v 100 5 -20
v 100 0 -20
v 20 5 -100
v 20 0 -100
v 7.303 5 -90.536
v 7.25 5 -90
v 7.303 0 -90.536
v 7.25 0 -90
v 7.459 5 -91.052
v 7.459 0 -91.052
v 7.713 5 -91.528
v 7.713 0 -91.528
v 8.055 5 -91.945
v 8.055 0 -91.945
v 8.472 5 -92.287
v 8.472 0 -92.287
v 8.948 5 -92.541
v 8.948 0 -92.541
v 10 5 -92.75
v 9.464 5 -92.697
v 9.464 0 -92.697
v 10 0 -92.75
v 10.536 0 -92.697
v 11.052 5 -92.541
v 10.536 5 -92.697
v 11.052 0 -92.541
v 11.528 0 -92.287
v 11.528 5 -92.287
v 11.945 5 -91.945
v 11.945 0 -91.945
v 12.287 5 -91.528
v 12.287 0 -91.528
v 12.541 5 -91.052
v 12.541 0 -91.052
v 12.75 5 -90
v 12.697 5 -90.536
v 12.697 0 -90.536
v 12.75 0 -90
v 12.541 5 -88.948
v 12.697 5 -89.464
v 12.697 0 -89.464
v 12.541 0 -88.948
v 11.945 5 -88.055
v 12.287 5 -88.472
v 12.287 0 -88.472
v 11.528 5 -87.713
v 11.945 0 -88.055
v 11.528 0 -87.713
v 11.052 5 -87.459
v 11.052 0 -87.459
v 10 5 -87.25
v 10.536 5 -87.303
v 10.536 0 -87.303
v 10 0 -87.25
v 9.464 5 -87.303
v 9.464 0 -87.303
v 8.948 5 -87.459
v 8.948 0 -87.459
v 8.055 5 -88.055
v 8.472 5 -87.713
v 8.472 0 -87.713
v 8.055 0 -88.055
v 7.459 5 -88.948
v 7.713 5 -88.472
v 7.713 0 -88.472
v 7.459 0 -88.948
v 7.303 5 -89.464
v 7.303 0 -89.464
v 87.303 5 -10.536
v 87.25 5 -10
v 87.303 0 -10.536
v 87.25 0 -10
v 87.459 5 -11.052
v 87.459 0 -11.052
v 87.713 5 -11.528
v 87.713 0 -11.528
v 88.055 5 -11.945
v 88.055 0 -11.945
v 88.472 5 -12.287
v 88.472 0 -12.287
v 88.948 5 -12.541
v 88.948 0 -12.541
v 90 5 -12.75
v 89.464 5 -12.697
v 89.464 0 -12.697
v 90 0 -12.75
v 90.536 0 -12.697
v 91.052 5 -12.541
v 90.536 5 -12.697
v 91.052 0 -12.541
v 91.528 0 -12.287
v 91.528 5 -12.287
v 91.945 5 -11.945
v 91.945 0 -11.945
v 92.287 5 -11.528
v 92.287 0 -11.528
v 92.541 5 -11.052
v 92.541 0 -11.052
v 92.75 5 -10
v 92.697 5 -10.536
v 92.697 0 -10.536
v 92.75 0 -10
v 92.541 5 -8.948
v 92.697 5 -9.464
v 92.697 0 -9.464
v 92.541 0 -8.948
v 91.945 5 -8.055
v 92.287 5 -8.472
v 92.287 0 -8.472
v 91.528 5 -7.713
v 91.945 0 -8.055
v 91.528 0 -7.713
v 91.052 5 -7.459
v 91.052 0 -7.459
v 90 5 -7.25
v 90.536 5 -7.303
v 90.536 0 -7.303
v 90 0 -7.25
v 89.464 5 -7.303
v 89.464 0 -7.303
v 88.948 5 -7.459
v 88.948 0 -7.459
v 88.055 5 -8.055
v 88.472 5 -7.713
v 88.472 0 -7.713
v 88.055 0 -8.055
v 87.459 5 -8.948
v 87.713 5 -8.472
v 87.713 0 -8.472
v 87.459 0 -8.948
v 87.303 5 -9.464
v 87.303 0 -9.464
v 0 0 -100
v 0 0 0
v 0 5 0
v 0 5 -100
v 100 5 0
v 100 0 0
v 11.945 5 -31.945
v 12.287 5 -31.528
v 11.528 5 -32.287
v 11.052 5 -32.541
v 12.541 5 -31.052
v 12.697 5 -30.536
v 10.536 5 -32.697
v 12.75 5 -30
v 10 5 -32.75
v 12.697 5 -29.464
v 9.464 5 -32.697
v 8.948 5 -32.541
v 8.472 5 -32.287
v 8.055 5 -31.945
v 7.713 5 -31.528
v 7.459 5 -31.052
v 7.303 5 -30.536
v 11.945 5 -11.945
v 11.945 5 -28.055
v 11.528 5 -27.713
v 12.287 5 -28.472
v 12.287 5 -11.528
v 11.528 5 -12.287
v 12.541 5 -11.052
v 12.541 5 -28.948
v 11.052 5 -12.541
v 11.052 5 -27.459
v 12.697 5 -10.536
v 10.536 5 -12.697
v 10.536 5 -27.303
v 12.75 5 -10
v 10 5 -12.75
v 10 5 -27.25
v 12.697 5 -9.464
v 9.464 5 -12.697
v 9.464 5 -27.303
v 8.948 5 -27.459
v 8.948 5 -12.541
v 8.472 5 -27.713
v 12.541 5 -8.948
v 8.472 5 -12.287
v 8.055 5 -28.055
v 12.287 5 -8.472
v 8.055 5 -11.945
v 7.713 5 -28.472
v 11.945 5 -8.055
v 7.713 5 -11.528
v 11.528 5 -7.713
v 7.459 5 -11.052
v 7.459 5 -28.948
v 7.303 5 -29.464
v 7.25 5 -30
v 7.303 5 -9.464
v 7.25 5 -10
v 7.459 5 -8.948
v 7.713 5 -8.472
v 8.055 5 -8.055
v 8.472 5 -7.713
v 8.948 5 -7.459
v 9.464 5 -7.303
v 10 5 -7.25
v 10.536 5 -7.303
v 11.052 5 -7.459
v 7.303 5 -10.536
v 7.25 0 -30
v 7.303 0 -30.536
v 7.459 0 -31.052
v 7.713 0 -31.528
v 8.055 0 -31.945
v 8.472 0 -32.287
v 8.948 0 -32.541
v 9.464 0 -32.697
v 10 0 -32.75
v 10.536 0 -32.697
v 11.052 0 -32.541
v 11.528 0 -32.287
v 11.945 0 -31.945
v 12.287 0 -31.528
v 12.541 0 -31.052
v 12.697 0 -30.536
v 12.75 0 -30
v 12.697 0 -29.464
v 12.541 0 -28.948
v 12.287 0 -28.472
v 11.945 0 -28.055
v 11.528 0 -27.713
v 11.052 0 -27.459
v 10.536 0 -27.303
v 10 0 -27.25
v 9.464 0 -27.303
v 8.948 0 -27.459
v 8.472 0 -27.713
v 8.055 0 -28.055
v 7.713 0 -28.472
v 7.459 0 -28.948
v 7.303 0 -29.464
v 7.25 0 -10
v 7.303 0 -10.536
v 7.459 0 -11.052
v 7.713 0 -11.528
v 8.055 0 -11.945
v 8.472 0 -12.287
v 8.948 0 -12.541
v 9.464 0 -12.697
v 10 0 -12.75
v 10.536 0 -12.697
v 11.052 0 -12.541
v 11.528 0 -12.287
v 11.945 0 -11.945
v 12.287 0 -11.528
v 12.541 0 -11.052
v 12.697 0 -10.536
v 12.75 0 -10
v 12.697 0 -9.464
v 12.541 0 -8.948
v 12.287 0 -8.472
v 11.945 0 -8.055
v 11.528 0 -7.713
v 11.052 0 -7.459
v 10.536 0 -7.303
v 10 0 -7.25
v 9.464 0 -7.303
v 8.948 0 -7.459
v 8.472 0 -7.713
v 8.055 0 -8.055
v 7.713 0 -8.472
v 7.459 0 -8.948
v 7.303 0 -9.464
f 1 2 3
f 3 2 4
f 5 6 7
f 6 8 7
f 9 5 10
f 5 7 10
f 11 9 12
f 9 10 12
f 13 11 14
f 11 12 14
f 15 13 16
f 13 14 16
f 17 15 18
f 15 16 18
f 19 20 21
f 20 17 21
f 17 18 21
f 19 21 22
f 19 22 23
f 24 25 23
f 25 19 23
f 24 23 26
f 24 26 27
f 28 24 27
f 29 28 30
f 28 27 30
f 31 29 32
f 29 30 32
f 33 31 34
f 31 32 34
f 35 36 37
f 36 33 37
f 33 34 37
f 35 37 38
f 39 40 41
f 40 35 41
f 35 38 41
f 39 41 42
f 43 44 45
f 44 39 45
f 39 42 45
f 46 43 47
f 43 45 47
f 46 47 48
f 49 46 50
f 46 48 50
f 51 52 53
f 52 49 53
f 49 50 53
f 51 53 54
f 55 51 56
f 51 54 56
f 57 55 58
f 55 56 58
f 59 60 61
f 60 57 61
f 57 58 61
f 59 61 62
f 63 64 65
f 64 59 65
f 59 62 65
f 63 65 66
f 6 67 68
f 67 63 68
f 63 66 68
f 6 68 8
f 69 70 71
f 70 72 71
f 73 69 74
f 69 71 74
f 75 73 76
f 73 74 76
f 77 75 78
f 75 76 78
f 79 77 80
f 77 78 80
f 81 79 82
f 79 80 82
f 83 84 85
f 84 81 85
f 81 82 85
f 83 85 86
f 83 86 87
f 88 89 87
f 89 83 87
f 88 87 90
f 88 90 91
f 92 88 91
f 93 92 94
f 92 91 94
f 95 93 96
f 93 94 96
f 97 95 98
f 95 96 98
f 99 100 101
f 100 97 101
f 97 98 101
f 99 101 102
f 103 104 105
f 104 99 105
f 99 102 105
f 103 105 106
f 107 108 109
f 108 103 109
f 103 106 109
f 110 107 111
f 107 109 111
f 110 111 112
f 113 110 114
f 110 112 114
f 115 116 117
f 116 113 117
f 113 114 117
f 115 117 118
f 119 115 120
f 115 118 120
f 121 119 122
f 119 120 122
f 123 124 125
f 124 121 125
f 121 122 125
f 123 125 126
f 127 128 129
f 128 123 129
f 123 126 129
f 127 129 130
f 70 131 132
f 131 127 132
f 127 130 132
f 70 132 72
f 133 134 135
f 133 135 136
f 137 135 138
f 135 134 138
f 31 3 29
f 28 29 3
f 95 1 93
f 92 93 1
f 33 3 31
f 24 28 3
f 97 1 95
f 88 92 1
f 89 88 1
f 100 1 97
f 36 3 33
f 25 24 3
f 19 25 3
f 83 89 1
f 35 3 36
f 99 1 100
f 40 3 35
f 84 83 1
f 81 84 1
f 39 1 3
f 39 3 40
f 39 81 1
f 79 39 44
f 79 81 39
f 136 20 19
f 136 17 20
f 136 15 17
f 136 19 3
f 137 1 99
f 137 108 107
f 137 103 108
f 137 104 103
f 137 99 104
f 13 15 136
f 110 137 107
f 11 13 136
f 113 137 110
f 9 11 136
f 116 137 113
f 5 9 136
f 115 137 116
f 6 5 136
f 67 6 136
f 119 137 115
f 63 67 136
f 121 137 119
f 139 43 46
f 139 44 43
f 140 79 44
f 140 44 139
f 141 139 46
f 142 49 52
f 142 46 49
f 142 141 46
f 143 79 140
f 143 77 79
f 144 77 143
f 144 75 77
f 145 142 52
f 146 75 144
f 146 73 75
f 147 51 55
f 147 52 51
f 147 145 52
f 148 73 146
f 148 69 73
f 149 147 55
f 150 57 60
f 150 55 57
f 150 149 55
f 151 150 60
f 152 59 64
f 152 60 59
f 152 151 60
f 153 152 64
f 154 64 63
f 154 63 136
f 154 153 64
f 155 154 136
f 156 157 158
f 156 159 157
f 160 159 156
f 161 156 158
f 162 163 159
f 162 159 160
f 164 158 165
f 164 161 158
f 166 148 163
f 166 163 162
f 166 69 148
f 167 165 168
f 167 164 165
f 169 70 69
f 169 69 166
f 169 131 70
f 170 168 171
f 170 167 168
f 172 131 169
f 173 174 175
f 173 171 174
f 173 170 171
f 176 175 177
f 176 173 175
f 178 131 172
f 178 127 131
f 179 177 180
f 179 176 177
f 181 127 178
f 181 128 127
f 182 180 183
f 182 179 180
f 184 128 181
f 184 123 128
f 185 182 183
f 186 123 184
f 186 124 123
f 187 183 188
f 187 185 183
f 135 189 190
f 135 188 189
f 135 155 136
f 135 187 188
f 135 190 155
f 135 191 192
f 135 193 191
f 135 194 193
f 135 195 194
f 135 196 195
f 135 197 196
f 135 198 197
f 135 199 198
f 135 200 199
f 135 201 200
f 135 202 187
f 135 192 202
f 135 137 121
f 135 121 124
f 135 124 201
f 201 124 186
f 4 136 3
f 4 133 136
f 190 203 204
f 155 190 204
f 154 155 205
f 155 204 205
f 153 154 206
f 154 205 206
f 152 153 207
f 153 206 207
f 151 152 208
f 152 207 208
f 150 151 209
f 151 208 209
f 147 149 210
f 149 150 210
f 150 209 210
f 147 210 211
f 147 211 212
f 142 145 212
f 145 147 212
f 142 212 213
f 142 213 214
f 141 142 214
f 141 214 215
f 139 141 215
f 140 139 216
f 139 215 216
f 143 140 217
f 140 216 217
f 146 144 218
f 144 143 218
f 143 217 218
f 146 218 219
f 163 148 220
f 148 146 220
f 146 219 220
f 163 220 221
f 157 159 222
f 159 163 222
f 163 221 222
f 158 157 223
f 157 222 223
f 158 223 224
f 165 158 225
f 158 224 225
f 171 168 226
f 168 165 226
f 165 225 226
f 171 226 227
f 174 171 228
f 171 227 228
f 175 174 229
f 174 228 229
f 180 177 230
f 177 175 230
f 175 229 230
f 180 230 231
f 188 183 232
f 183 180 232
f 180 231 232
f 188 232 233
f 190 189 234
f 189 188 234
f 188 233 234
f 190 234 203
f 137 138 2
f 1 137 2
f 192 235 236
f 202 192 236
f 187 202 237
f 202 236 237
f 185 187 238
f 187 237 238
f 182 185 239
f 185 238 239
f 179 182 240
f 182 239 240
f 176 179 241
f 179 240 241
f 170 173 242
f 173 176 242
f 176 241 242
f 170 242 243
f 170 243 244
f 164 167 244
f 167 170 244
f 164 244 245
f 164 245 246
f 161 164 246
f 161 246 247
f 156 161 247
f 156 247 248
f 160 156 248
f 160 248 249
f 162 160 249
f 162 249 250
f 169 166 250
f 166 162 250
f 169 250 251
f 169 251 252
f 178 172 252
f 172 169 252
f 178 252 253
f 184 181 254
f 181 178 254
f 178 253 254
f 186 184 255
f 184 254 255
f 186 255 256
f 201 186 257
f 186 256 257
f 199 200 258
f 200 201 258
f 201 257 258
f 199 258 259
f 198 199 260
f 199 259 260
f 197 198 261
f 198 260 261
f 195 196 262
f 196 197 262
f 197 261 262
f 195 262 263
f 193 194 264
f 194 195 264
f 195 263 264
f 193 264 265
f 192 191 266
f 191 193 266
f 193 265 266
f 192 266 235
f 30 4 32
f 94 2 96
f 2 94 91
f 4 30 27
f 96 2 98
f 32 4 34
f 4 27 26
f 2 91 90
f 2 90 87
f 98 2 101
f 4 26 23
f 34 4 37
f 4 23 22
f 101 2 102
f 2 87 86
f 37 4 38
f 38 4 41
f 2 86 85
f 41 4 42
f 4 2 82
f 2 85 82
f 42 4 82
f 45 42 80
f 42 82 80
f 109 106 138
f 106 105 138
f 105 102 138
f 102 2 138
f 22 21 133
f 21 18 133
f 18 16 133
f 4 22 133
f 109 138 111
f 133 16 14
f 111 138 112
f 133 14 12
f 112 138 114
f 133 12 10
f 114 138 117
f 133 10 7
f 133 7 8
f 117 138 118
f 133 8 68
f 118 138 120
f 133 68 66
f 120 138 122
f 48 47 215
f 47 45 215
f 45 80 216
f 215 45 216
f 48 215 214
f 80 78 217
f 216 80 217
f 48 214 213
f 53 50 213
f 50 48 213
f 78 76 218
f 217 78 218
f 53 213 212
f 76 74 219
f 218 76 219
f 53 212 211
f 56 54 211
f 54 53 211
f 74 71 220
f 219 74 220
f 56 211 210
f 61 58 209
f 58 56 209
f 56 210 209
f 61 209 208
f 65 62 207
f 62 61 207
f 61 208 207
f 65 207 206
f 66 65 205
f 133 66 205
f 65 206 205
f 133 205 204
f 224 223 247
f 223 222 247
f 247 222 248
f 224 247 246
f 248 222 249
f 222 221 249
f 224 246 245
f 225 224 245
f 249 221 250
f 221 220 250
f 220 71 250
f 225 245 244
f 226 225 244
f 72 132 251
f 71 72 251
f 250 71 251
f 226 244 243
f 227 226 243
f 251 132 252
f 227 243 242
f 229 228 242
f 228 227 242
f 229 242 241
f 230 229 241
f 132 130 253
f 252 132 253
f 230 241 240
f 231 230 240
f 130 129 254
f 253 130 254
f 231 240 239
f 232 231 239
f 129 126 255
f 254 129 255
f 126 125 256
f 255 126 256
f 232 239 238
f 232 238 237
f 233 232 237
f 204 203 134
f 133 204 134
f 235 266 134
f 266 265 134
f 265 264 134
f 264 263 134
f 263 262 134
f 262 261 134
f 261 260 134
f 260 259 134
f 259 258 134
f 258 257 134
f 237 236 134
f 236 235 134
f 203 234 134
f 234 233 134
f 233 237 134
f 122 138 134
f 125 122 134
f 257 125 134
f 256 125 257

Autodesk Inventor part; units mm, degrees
ref_plane "YZ Plane" through (0, 0, 0) normal (1, 0, 0) x (0, 1, 0)
ref_plane "XZ Plane" through (0, 0, 0) normal (0, 1, 0) x (-1, 0, 0)
ref_plane "XY Plane" through (0, 0, 0) normal (0, 0, 1) x (1, 0, 0)
sketch "Sketch1" plane through (0, 0, 0) normal (0, 1, 0) x (-1, 0, 0)
  line L0 (0, 0) -> (0, -100)
  line L1 (0, -100) -> (-20, -100)
  line L2 (0, 0) -> (-100, 0)
  line L3 (-100, 0) -> (-100, -20)
  line L4 (-100, -20) -> (-20, -100)
  line L5 (26.0864, -10) -> (-132.7995, -10) construction
  line L6 (-10, 33.7229) -> (-10, -136.0235) construction
  circle A0 centre (-10, -10) radius 2.75
  circle A1 centre (-10, -90) radius 2.75
  circle A2 centre (-10, -30) radius 2.75
  circle A3 centre (-90, -10) radius 2.75
  dimension "d0" = 100
  dimension "d1" = 20
  dimension "d2" = 100
  dimension "d3" = 20
  dimension "d4" = 10
  dimension "d5" = 10
  dimension "d6" = 5.5
  dimension "d7" = 5.5
  dimension "d8" = 5.5
  dimension "d9" = 5.5
  dimension "d10" = 10
  dimension "d11" = 30
  dimension "d12" = 10
extrude "Extrusion1" add sketch "Sketch1" along normal blind 5
equation "\"d0\" = dimension"
equation "\"d1\" = perfil_ancho"
equation "\"d2\" = dimension"
equation "\"d3\" = perfil_ancho"
equation "\"d4\" = 0.5 * perfil_ancho"
equation "\"d5\" = 0.5 * perfil_ancho"
equation "\"d6\" = hueco_diametro"
equation "\"d7\" = hueco_diametro"
equation "\"d8\" = hueco_diametro"
equation "\"d9\" = hueco_diametro"
equation "\"d10\" = separación"
equation "\"d11\" = perfil_ancho + separación"
equation "\"d12\" = separación"
equation "\"d13\" = espesor"
equation "\"perfil_ancho\" = 20"
equation "\"dimension\" = 100"
equation "\"separación\" = 10"
equation "\"espesor\" = 5"
equation "\"tol\" = 0.5"
equation "\"hueco_diametro\" = 5.5"
properties part number "soporte tipo triangulo"
